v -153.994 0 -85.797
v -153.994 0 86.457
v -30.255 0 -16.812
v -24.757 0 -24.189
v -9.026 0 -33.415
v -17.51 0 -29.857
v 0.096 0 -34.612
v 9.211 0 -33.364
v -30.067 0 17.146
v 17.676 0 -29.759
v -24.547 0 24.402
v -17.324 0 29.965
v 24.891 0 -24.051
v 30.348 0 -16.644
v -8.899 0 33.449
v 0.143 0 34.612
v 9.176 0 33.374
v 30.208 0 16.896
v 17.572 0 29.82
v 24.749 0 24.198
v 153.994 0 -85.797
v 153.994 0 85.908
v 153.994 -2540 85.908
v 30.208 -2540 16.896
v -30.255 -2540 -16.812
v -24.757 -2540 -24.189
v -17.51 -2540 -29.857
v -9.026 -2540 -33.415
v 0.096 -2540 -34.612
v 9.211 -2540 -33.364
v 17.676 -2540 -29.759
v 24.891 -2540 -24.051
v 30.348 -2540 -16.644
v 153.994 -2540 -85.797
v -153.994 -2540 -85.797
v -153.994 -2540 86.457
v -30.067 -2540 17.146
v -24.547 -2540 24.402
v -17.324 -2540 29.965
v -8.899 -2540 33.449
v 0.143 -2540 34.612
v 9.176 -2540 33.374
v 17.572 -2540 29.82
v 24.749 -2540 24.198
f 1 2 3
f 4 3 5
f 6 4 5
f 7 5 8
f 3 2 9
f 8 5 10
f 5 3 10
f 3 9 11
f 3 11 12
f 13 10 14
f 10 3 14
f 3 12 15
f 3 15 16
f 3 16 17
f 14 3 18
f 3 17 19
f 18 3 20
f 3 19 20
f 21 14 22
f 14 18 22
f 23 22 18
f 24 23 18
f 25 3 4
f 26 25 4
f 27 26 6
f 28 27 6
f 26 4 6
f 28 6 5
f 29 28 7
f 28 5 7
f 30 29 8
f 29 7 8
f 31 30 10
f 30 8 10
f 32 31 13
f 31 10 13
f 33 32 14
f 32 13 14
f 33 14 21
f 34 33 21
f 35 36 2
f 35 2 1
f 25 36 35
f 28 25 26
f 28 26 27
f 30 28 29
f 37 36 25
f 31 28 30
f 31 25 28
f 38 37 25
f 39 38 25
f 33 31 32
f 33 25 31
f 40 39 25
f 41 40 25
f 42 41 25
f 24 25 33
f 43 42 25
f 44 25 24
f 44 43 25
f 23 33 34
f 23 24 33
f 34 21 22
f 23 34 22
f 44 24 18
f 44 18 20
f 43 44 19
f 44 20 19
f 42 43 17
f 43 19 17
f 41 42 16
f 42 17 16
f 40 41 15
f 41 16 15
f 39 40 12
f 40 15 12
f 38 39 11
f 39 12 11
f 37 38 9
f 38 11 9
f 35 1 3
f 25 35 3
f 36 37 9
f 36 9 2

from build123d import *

# Parameters (mm, degrees)
F1_DEPTH = 2540


with BuildPart() as f1:
    # F0 (on Front) → F1 (new body)
    with BuildSketch(Plane.XZ):
        with BuildLine():
            Line((153.9936810732, 85.9075784683), (30.2082335464, 16.8963483059))
            ThreePointArc((30.2082335464, 16.8963483059), (33.4933271093, 8.7304638603), (34.6124827204, 0))
            ThreePointArc((34.6124827204, 0), (33.5294597887, -8.5906511012), (30.3481664655, -16.6437000769))
            Line((30.3481664655, -16.6437000769), (153.9936810732, -85.7974737883))
            Line((153.9936810732, -85.7974737883), (153.9936810732, 85.9075784683))
        make_face()
        with BuildLine():
            ThreePointArc((30.2082335464, 16.8963483059), (0.1433871846, 34.6121857181), (-30.0672068078, 17.1460501237))
            Line((-30.0672068078, 17.1460501237), (0.2459637966, 0.192178832))
            Line((0.2459637966, 0.192178832), (30.2082335464, 16.8963483059))
        make_face()
        with BuildLine():
            Line((30.3481664655, -16.6437000769), (0.2459637966, 0.192178832))
            Line((0.2459637966, 0.192178832), (-30.2550625521, -16.8123511155))
            ThreePointArc((-30.2550625521, -16.8123511155), (0.0963217415, -34.6123486951), (30.3481664655, -16.6437000769))
        make_face()
        with BuildLine():
            Line((0.2459637966, 0.192178832), (-30.0672068078, 17.1460501237))
            ThreePointArc((-30.0672068078, 17.1460501237), (-34.6119531212, 0.1914711524), (-30.2550625521, -16.8123511155))
            Line((-30.2550625521, -16.8123511155), (0.2459637966, 0.192178832))
        make_face()
        with BuildLine():
            Line((30.2082335464, 16.8963483059), (0.2459637966, 0.192178832))
            Line((0.2459637966, 0.192178832), (30.3481664655, -16.6437000769))
            ThreePointArc((30.3481664655, -16.6437000769), (33.5294597887, -8.5906511012), (34.6124827204, 0))
            ThreePointArc((34.6124827204, 0), (33.4933271093, 8.7304638603), (30.2082335464, 16.8963483059))
        make_face()
        with BuildLine():
            Line((-30.0672068078, 17.1460501237), (-153.9936810732, 86.4569619298))
            Line((-153.9936810732, 86.4569619298), (-153.9936810732, -85.7974737883))
            Line((-153.9936810732, -85.7974737883), (-30.2550625521, -16.8123511155))
            ThreePointArc((-30.2550625521, -16.8123511155), (-34.6119531212, 0.1914711524), (-30.0672068078, 17.1460501237))
        make_face()
    extrude(amount=F1_DEPTH)


solid = f1.part
